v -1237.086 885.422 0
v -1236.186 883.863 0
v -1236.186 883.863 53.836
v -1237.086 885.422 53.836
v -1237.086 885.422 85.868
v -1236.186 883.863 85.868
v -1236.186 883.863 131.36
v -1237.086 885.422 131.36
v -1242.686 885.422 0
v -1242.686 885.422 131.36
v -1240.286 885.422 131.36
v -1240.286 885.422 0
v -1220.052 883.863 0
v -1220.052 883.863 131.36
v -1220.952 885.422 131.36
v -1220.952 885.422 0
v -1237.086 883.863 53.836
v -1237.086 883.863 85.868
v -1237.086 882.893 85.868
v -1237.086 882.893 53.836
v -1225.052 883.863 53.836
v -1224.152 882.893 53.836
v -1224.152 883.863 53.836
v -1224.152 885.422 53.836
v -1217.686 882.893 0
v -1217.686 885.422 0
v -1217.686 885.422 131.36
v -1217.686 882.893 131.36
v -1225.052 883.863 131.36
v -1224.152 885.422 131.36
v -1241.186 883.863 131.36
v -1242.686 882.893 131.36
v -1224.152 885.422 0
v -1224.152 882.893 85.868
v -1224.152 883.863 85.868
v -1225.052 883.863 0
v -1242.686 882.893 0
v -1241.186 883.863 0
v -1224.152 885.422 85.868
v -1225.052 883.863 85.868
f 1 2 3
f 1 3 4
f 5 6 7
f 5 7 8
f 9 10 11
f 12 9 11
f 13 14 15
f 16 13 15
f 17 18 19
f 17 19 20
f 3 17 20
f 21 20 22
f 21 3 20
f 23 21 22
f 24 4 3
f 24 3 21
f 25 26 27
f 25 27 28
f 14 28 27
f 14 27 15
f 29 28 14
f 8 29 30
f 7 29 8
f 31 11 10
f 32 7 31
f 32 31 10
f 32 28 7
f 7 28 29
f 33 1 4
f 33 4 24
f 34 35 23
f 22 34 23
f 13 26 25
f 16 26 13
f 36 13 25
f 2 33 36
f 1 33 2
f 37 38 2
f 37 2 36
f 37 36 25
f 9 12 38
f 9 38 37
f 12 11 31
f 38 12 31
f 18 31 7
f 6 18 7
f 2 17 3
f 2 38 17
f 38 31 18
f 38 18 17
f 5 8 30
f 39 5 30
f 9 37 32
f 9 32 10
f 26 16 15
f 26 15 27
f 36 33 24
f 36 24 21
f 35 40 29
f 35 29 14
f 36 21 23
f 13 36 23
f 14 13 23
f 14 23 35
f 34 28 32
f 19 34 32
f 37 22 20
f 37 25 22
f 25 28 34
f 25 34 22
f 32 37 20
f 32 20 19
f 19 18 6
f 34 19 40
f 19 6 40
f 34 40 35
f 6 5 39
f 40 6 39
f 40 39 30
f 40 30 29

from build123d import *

# Parameters (mm, degrees)
BOSS_EXTRUDE1_DEPTH = 150
CUT_EXTRUDE4_REACH  = 1253.709
SKETCH5_W           = 12.933974596
SKETCH5_H           = 32.032750252
SKETCH7_W           = 25
SKETCH7_H           = 18.64
CUT_EXTRUDE5_DEPTH  = 1252.708964453


with BuildPart() as part:
    # Sketch1 → Boss-Extrude1 (new body)
    with BuildSketch(Plane.XY):
        Polygon((-1242.686178465, 885.422015852), (-1240.286178465, 885.422015852), (-1241.186178465, 883.863170125), (-1236.186178465, 883.863170125), (-1237.086178465, 885.422015852), (-1224.152203869, 885.422015852), (-1225.052203869, 883.863170125), (-1220.052203869, 883.863170125), (-1220.952203869, 885.422015852), (-1217.686178465, 885.422015852), (-1217.686178465, 882.893470027), (-1242.686178465, 882.893470027), align=None)
    extrude(amount=BOSS_EXTRUDE1_DEPTH)

    # Cut-Extrude4: up to this face of the body (flat: up to its plane)
    cut_extrude4_end = Plane(part.part.faces().sort_by_distance((-1230.186178465, 882.893470027, 75))[0])
    # Sketch5 → Cut-Extrude4 (cut, up to the picked face)
    with BuildSketch(Plane(origin=(0, 885.422015852, 0), x_dir=(1, 0, 0), z_dir=(0, 1, 0)), mode=Mode.PRIVATE) as cut_extrude4_sk1:
        with Locations((-1230.619191167, -69.852079699)):
            Rectangle(SKETCH5_W, SKETCH5_H)
    cut_extrude4_tool1 = split(extrude(cut_extrude4_sk1.sketch, amount=-CUT_EXTRUDE4_REACH, mode=Mode.PRIVATE), bisect_by=cut_extrude4_end, keep=Keep.BOTH, mode=Mode.PRIVATE)
    add(cut_extrude4_tool1.solids().sort_by(Axis((-1230.619191, 885.422016, 69.85208), (0, -1, 0)))[0], mode=Mode.SUBTRACT)

    # Sketch7 → Cut-Extrude5 (cut, through all)
    with BuildSketch(Plane(origin=(0, 882.893470027, 0), x_dir=(-1, 0, 0), z_dir=(0, -1, 0))):
        with Locations((1230.186178465, -140.68)):
            Rectangle(SKETCH7_W, SKETCH7_H)
    extrude(amount=-CUT_EXTRUDE5_DEPTH, mode=Mode.SUBTRACT)


solid = part.part
